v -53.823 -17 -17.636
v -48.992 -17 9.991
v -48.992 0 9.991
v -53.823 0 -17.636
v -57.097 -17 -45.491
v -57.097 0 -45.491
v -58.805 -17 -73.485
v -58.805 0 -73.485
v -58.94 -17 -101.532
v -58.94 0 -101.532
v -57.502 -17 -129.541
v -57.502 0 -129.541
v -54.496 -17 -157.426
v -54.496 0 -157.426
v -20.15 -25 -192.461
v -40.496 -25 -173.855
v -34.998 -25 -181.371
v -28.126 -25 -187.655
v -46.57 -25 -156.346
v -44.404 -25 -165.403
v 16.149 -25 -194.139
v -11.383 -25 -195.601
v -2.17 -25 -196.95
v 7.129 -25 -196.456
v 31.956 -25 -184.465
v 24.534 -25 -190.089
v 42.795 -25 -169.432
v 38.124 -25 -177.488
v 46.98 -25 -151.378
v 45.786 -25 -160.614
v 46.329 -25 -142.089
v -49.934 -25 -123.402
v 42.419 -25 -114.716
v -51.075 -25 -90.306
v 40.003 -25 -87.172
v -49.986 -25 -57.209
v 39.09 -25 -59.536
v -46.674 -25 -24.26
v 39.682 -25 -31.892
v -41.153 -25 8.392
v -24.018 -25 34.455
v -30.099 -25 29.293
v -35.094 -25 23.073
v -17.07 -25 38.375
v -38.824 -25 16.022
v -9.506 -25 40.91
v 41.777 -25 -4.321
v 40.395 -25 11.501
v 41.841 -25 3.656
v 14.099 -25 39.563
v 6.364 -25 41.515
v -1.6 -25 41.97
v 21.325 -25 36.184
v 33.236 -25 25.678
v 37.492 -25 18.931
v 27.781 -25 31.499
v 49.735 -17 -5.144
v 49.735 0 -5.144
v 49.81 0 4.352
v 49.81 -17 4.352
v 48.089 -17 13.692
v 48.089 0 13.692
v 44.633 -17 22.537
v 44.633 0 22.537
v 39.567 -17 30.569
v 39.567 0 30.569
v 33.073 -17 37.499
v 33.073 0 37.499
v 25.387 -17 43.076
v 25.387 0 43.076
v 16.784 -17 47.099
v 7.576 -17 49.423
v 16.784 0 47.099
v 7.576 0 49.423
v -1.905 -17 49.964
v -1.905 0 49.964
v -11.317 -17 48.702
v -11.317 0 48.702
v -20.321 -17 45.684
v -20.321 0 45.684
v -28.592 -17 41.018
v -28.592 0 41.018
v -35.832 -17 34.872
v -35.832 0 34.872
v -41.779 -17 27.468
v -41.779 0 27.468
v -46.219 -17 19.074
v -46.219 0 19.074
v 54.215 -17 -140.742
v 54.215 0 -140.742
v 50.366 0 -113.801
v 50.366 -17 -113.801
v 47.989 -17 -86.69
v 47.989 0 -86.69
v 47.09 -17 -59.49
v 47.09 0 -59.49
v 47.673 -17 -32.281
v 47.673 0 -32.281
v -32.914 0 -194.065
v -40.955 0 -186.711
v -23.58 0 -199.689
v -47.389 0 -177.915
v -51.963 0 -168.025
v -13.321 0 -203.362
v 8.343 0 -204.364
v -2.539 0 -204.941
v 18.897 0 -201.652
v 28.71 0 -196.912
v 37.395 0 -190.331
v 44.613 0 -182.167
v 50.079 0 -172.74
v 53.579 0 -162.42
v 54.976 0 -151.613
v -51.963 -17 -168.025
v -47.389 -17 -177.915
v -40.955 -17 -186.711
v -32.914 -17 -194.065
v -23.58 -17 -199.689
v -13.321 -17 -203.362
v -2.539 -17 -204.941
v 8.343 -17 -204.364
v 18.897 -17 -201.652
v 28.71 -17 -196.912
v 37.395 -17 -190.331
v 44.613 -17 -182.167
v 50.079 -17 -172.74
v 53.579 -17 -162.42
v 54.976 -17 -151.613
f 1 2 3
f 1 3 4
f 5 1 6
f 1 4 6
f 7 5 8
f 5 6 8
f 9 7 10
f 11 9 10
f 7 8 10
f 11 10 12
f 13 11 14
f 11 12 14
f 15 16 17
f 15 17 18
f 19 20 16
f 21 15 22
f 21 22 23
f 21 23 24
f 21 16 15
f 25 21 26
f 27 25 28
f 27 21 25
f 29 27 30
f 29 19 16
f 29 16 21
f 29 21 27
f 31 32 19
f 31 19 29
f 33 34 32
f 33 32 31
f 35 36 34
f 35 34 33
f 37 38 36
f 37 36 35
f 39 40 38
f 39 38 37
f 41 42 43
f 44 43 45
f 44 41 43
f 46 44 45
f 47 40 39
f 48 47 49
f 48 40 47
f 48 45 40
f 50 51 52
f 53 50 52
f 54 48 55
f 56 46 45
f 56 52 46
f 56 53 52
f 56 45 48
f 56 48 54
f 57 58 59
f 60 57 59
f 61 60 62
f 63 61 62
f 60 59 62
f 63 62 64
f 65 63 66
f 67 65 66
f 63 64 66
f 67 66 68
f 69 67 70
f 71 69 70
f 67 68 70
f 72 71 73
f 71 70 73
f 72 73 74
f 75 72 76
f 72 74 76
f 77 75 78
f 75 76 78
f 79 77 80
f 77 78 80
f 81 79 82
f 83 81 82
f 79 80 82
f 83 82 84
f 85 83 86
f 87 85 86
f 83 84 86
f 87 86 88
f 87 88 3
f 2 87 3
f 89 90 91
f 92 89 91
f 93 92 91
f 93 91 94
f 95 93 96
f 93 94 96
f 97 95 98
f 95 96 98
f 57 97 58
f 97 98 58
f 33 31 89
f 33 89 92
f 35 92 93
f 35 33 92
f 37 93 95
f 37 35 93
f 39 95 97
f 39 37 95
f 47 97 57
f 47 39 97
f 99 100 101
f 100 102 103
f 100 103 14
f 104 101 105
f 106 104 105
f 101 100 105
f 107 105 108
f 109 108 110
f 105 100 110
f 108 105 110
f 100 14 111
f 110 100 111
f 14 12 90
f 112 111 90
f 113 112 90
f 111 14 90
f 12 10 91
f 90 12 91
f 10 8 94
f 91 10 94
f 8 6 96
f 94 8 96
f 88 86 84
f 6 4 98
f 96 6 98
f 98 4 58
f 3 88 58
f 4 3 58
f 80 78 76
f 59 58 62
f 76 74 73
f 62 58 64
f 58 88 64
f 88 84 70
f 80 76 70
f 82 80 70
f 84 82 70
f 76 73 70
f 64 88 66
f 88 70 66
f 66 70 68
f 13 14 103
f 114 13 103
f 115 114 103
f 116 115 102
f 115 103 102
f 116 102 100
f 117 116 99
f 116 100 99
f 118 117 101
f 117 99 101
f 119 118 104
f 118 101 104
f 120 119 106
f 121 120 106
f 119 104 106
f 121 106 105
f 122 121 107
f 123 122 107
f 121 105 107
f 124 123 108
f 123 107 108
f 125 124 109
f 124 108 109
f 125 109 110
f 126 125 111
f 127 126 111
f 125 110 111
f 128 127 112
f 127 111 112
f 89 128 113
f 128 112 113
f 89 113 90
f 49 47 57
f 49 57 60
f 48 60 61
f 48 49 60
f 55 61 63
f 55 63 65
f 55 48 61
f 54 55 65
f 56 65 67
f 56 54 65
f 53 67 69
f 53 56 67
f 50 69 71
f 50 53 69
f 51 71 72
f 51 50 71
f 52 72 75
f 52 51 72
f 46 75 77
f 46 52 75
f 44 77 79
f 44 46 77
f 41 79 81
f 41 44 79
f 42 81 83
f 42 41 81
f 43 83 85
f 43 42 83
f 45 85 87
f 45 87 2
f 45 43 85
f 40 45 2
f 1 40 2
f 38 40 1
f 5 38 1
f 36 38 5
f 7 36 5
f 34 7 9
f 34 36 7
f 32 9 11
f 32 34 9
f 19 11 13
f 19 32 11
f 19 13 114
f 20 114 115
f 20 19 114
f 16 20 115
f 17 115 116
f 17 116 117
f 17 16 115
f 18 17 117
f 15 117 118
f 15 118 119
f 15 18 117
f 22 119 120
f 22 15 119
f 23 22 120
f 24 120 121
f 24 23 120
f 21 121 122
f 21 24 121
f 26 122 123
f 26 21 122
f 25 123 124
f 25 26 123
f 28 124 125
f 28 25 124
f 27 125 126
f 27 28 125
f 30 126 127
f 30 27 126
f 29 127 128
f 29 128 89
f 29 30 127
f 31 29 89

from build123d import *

# Parameters (mm, degrees)
F1_DEPTH = 25
F2_SIZE  = 8


with BuildPart() as f1:
    # F0 (on Front) → F1 (new body)
    with BuildSketch(Plane.XZ):
        with BuildLine():
            ThreePointArc((54.215298, -140.742492), (47.354384, -73.095896), (49.734695, -5.143939))
            ThreePointArc((49.734695, -5.143939), (7.576454, 49.42264), (-48.991684, 9.990741))
            ThreePointArc((-48.991684, 9.990741), (-58.804788, -73.485486), (-54.496368, -157.42603))
            ThreePointArc((-54.496368, -157.42603), (8.342952, -204.363546), (54.215298, -140.742492))
        make_face()
    extrude(amount=F1_DEPTH)

    # F2
    f2_edges = [f1.edges().sort_by_distance(p)[0] for p in [
        (7.576454, -25, 49.42264),
    ]]
    chamfer(f2_edges, length=F2_SIZE)


solid = f1.part
